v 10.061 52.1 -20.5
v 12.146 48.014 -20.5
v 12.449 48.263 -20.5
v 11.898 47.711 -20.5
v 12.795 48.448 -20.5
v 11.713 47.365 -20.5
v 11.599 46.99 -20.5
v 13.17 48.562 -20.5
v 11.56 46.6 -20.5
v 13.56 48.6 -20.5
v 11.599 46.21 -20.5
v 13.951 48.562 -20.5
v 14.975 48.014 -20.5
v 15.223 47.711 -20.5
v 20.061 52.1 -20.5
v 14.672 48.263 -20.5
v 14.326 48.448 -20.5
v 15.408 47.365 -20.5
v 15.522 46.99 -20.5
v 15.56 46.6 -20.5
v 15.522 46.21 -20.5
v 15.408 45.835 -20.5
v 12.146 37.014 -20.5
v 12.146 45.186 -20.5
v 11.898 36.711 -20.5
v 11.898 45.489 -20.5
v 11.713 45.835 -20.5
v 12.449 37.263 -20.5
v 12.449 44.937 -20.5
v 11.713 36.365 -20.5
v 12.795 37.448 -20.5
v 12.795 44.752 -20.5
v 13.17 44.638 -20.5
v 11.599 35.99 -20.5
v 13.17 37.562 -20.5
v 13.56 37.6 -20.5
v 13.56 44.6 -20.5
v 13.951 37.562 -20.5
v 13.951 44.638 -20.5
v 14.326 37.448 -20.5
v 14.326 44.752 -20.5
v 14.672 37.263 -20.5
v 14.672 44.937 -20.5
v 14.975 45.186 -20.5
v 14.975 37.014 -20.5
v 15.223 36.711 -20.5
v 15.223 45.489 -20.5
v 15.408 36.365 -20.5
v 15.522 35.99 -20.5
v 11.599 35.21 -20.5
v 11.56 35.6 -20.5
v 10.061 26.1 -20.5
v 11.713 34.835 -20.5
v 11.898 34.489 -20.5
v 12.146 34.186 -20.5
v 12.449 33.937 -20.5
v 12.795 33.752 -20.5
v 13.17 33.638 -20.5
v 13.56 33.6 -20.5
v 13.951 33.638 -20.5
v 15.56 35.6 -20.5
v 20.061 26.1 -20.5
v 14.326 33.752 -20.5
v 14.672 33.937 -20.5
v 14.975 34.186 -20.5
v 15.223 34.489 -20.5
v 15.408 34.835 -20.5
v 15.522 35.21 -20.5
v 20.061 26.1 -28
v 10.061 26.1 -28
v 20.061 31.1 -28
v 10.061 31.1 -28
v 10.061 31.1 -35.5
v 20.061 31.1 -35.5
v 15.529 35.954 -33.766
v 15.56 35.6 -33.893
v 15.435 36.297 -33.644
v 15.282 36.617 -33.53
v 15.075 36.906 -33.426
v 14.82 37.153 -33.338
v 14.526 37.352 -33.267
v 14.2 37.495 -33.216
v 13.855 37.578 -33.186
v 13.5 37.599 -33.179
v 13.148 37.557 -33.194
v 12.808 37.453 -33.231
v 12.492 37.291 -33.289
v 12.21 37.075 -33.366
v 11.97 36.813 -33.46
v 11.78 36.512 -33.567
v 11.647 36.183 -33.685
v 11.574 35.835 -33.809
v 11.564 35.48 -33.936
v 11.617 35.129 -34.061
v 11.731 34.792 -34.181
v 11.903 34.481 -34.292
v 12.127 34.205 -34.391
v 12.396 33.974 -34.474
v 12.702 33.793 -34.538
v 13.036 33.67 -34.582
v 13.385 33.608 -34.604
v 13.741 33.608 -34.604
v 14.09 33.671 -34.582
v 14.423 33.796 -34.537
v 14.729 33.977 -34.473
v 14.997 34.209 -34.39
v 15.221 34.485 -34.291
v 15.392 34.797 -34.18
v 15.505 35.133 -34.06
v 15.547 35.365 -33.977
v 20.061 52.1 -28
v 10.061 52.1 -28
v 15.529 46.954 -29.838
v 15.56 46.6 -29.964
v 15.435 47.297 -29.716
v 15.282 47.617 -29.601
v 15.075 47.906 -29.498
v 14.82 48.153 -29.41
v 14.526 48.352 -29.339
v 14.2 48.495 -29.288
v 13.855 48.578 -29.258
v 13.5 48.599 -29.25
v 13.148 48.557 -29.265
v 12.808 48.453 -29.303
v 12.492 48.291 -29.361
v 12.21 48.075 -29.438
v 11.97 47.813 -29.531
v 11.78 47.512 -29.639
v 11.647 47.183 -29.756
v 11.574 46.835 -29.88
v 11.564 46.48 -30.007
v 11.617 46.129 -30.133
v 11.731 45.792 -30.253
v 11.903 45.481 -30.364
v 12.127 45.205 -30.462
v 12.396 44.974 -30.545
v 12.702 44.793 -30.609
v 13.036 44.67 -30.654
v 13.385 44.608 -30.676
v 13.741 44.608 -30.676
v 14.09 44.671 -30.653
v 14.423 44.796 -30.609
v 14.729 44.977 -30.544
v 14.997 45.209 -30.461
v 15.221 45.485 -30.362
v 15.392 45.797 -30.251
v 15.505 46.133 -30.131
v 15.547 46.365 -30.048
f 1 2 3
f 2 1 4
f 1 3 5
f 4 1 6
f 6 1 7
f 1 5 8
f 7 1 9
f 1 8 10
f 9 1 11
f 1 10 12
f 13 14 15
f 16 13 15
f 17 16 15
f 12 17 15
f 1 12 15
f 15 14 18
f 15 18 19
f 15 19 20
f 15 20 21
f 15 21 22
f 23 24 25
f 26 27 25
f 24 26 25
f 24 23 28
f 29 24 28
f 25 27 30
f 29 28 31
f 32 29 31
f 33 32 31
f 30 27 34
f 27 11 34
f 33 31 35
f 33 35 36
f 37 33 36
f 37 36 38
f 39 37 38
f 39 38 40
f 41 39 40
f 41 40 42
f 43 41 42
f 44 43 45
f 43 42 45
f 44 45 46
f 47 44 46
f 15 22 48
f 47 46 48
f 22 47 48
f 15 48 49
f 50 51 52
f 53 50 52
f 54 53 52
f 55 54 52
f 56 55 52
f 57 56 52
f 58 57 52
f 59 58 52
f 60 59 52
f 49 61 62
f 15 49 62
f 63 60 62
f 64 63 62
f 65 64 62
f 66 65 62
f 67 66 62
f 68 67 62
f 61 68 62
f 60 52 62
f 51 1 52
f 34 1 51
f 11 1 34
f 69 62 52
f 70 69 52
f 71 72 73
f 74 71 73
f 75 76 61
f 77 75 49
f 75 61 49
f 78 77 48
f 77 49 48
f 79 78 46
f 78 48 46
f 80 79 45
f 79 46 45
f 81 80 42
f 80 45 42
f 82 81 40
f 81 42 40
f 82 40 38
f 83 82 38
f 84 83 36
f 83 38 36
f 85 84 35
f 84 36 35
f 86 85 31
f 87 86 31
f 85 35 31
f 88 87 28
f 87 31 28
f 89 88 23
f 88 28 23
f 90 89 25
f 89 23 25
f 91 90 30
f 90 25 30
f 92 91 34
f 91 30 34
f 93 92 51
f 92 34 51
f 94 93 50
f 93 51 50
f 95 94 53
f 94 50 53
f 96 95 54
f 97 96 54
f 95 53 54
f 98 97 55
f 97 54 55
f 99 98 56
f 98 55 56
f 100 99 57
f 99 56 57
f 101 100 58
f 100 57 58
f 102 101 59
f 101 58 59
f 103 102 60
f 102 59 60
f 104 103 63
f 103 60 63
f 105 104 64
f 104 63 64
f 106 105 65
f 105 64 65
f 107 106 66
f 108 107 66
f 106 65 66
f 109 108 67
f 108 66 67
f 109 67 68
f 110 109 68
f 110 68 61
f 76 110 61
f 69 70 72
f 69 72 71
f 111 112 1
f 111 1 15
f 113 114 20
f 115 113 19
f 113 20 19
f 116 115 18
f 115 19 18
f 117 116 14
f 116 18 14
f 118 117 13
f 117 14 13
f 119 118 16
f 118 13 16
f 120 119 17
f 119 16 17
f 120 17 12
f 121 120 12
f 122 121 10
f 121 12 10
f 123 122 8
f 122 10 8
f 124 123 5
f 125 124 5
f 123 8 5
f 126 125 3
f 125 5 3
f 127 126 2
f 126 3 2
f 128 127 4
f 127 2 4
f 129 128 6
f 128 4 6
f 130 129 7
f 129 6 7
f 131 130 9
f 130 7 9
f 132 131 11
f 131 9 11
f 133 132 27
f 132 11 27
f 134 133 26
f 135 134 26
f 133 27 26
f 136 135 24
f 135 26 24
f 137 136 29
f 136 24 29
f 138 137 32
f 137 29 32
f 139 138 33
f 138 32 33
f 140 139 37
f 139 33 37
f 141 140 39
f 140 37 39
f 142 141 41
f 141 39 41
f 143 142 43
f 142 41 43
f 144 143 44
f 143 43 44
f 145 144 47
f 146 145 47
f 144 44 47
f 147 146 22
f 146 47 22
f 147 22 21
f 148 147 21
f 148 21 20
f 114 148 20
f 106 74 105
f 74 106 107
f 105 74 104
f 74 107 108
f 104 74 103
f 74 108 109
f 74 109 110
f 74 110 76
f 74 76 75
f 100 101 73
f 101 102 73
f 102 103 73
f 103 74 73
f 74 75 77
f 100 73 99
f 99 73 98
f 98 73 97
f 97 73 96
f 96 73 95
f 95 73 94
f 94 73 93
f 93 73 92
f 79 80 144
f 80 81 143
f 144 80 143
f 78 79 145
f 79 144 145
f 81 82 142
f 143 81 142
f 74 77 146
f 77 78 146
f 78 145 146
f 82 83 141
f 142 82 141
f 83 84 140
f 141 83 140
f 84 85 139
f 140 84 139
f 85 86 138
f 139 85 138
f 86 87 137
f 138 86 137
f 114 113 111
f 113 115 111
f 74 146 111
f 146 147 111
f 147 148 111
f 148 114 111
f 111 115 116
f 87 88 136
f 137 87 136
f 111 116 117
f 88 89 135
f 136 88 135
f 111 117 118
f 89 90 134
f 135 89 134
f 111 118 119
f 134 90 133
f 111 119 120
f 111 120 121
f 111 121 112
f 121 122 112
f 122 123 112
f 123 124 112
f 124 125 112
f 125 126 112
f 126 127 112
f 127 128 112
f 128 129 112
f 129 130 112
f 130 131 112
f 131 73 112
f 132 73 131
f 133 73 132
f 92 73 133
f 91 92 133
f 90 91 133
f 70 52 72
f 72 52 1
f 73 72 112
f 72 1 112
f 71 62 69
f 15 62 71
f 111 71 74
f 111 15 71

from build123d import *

# Parameters (mm, degrees)
SALIENTE_EXTRUIR1_DEPTH    = 10
CROQUIS2_W                 = 5
CROQUIS2_H                 = 45
CORTAR_EXTRUIR1_DEPTH      = 12.5
CROQUIS4_W                 = 73.322426794
CROQUIS4_H                 = 5
SALIENTE_EXTRUIR2_DEPTH    = 30
CROQUIS5_W                 = 2.5
CROQUIS5_H                 = 5
SALIENTE_EXTRUIR3_DEPTH    = 50
CROQUIS6_W                 = 55.637494131
CROQUIS6_H                 = 64.414873678
CORTAR_EXTRUIR2_DEPTH      = 55
CROQUIS7_R                 = 1.5
CORTAR_EXTRUIR3_DEPTH      = 5
CROQUIS8_W                 = 39.981329184
CROQUIS8_H                 = 5
CORTAR_EXTRUIR4_DEPTH      = 10
CROQUIS9_W                 = 10
CROQUIS9_H                 = 7.5
SALIENTE_EXTRUIR4_DEPTH    = 21
CROQUIS11_R                = 2
CORTAR_EXTRUIR5_DEPTH      = 21
SALIENTE_EXTRUIR5_START    = -40
CROQUIS12_W                = 21.008716652
CROQUIS12_H                = 5
SALIENTE_EXTRUIR5_DEPTH    = 40
CORTAR_EXTRUIR6_DEPTH      = 62.200166864
CROQUIS15_W                = 5
CROQUIS15_H                = 10
SALIENTE_EXTRUIR6_DEPTH    = 31.1
SALIENTE_EXTRUIR7_DEPTH    = 10
SALIENTE_EXTRUIR8_DEPTH    = 5
CORTAR_EXTRUIR7_START      = -13
CROQUIS21_R                = 1.5
CORTAR_EXTRUIR7_DEPTH      = 13
CORTAR_EXTRUIR10_START     = -52.1
CORTAR_EXTRUIR10_OUTLINE_W = 10
CORTAR_EXTRUIR10_OUTLINE_H = 7.5
CORTAR_EXTRUIR10_DEPTH     = 52.1
SALIENTE_EXTRUIR9_DEPTH    = 10
CROQUIS24_R                = 2
CORTAR_EXTRUIR11_DEPTH     = 10


# Read off the part's stored shape, not the designer's step: Cortar-Extruir10
with BuildPart() as part:
    # Croquis1 → Saliente-Extruir1 (new body)
    with BuildSketch(Plane.XY):
        with BuildLine():
            Line((-35, 10), (-35, 0))
            Line((-35, 0), (-30, 0))
            Line((-30, 0), (-30, 10))
            Line((-30, 10), (-20, 10))
            Line((-20, 10), (-20, 35.723707224))
            ThreePointArc((-20, 35.723707224), (0, 55.723707224), (20, 35.723707224))
            Line((20, 35.723707224), (20, 10))
            Line((20, 10), (30, 10))
            Line((30, 10), (30, 0))
            Line((30, 0), (35, 0))
            Line((35, 0), (35, 10))
            Line((35, 10), (39, 10))
            Line((39, 10), (39, 20))
            Line((39, 20), (14.443351433, 84.048407017))
            Line((14.443351433, 84.048407017), (13.447706691, 86.645237749))
            ThreePointArc((13.447706691, 86.645237749), (0, 95), (-13.447706691, 86.645237749))
            Line((-13.447706691, 86.645237749), (-14.443351433, 84.048407017))
            Line((-14.443351433, 84.048407017), (-39, 20))
            Line((-39, 20), (-39, 10))
            Line((-39, 10), (-35, 10))
        make_face()
        with BuildLine():
            ThreePointArc((1.5, 60), (0, 58.5), (-1.5, 60))
            Line((-1.5, 60), (-1.5, 80))
            ThreePointArc((-1.5, 80), (0, 81.5), (1.5, 80))
            Line((1.5, 80), (1.5, 60))
        make_face(mode=Mode.SUBTRACT)
    extrude(amount=SALIENTE_EXTRUIR1_DEPTH)

    # Croquis2 → Cortar-Extruir1 (cut, symmetric)
    with BuildSketch(Plane(origin=(0, 0, 0), x_dir=(0, 0, -1), z_dir=(1, 0, 0))):
        with Locations((-5, 72.5)):
            Rectangle(CROQUIS2_W, CROQUIS2_H)
    extrude(amount=CORTAR_EXTRUIR1_DEPTH, both=True, mode=Mode.SUBTRACT)

    # Croquis4 → Saliente-Extruir2 (add)
    with BuildSketch(Plane(origin=(0, 0, 0), x_dir=(-1, 0, 0), z_dir=(0, 0, -1))):
        with Locations((0, 28.6)):
            Rectangle(CROQUIS4_W, CROQUIS4_H)
    extrude(amount=SALIENTE_EXTRUIR2_DEPTH)

    # Croquis5 → Saliente-Extruir3 (add)
    with BuildSketch(Plane(origin=(-20, 0, 0), x_dir=(0, 0, -1), z_dir=(1, 0, 0))):
        with Locations((-8.75, 28.6)):
            Rectangle(CROQUIS5_W, CROQUIS5_H)
    extrude(amount=SALIENTE_EXTRUIR3_DEPTH)

    # Croquis6 → Cortar-Extruir2 (cut, symmetric)
    with BuildSketch(Plane(origin=(-20, 0, 0), x_dir=(0, 0, -1), z_dir=(1, 0, 0))):
        with Locations((17.818747066, 63.307436839)):
            Rectangle(CROQUIS6_W, CROQUIS6_H)
    extrude(amount=CORTAR_EXTRUIR2_DEPTH, both=True, mode=Mode.SUBTRACT)

    # Croquis7 → Cortar-Extruir3 (cut)
    with BuildSketch(Plane.XY.offset(10)):
        with Locations((0, 28.6)):
            Circle(CROQUIS7_R)
    extrude(amount=-CORTAR_EXTRUIR3_DEPTH, mode=Mode.SUBTRACT)

    # Croquis8 → Cortar-Extruir4 (cut)
    with BuildSketch(Plane(origin=(0, 31.1, 0), x_dir=(1, 0, 0), z_dir=(0, 1, 0))):
        with Locations((-0.009335408, 2.5)):
            Rectangle(CROQUIS8_W, CROQUIS8_H)
    extrude(amount=-CORTAR_EXTRUIR4_DEPTH, mode=Mode.SUBTRACT)

    # Croquis9 → Saliente-Extruir4 (add)
    with BuildSketch(Plane(origin=(0, 31.1, 0), x_dir=(1, 0, 0), z_dir=(0, 1, 0))):
        with Locations((15.061213397, 24.25)):
            Rectangle(CROQUIS9_W, CROQUIS9_H)
        with Locations((-35.940317185, 24.25)):
            Rectangle(CROQUIS9_W, CROQUIS9_H)
    extrude(amount=SALIENTE_EXTRUIR4_DEPTH)

    # Croquis11 → Cortar-Extruir5 (cut)
    with BuildSketch(Plane.XY.offset(-20.5)):
        with Locations((13.560448106, 46.6)):
            Circle(CROQUIS11_R)
        with Locations((13.560448106, 35.6)):
            Circle(CROQUIS11_R)
        with Locations((-34.439551894, 46.6)):
            Circle(CROQUIS11_R)
        with Locations((-34.439551894, 35.6)):
            Circle(CROQUIS11_R)
    extrude(amount=-CORTAR_EXTRUIR5_DEPTH, mode=Mode.SUBTRACT)

    # Croquis12 → Saliente-Extruir5 (add)
    with BuildSketch(Plane(origin=(0, 0, -30), x_dir=(-1, 0, 0), z_dir=(0, 0, -1)).offset(SALIENTE_EXTRUIR5_START)):
        with Locations((32.834428277, 28.6)):
            Rectangle(CROQUIS12_W, CROQUIS12_H)
    extrude(amount=SALIENTE_EXTRUIR5_DEPTH)

    # Croquis13 → Cortar-Extruir6 (cut, through all)
    with BuildSketch(Plane(origin=(0, 31.1, 0), x_dir=(1, 0, 0), z_dir=(0, 1, 0))):
        Polygon((34.744175198, 0), (36.661213397, 0), (36.661213397, 30), (21.661213397, 30), align=None)
    extrude(amount=-CORTAR_EXTRUIR6_DEPTH, mode=Mode.SUBTRACT)

    # Croquis15 → Saliente-Extruir6 (add)
    with BuildSketch(Plane(origin=(0, 31.1, 0), x_dir=(1, 0, 0), z_dir=(0, 1, 0))):
        with Locations((0, 25)):
            Rectangle(CROQUIS15_W, CROQUIS15_H)
    extrude(amount=-SALIENTE_EXTRUIR6_DEPTH)

    # Croquis18 → Saliente-Extruir7 (add)
    with BuildSketch(Plane.XY.offset(10)):
        Polygon((-39, 10), (-43.338786603, 26.1), (-36.661213397, 26.1), align=None)
    extrude(amount=-SALIENTE_EXTRUIR7_DEPTH)


with BuildPart() as body_2:
    # Croquis20 → Saliente-Extruir8 (new body)
    with BuildSketch(Plane(origin=(0, 31.1, 0), x_dir=(1, 0, 0), z_dir=(0, 1, 0))):
        Polygon((-1.624735856, -15), (1.624735856, -15), (34.744175198, -10), (-43.338786603, -10), align=None)
    extrude(amount=-SALIENTE_EXTRUIR8_DEPTH)

    # Croquis21 → Cortar-Extruir7 (cut)
    with BuildSketch(Plane(origin=(0, 0, 7.5), x_dir=(-1, 0, 0), z_dir=(0, 0, -1)).offset(CORTAR_EXTRUIR7_START)):
        with Locations(Location((0, 28.6, 0), (0, 0, 180))):
            Circle(CROQUIS21_R)
    extrude(amount=CORTAR_EXTRUIR7_DEPTH, mode=Mode.SUBTRACT)


with BuildPart() as cortar_extruir10_tool:
    # Cortar-Extruir10 outline → Cortar-Extruir10 (new body)
    with BuildSketch(Plane(origin=(0, 52.1, 0), x_dir=(1, 0, 0), z_dir=(0, 1, 0)).offset(CORTAR_EXTRUIR10_START)):
        Polygon((1.624735856, -15), (34.744175198, -10), (39, -10), (39, 0), (34.744175198, 0), (21.661213397, 30), (-43.338786603, 30), (-43.338786603, -10), (-1.624735856, -15), align=None)
        Polygon((20, -7.5), (-20, -7.5), (-20, 5), (19.981329184, 5), (19.981329184, 0), (20, 0), align=None, mode=Mode.SUBTRACT)
        with Locations((15.061213397, 24.25)):
            Rectangle(CORTAR_EXTRUIR10_OUTLINE_W, CORTAR_EXTRUIR10_OUTLINE_H, mode=Mode.SUBTRACT)
    extrude(amount=CORTAR_EXTRUIR10_DEPTH)


with BuildPart() as part_1:
    add(part.part)

    # Cortar-Extruir10: cut by cortar_extruir10_tool
    add(cortar_extruir10_tool.part, mode=Mode.SUBTRACT)

    # Croquis23 → Saliente-Extruir9 (add)
    with BuildSketch(Plane.ZY.offset(-10.061213397)):
        Polygon((-28, 31.1), (-35.5, 31.1), (-28, 52.1), align=None)
    extrude(amount=-SALIENTE_EXTRUIR9_DEPTH)

    # Croquis24 → Cortar-Extruir11 (cut)
    with BuildSketch(Plane.XY.offset(-28)):
        with Locations((13.560448106, 46.6)):
            Circle(CROQUIS24_R)
        with Locations((13.560448106, 35.6)):
            Circle(CROQUIS24_R)
    extrude(amount=-CORTAR_EXTRUIR11_DEPTH, mode=Mode.SUBTRACT)


with BuildPart() as body_2_1:
    add(body_2.part)

    # Cortar-Extruir10: cut by cortar_extruir10_tool
    add(cortar_extruir10_tool.part, mode=Mode.SUBTRACT)


solid = part_1.part
